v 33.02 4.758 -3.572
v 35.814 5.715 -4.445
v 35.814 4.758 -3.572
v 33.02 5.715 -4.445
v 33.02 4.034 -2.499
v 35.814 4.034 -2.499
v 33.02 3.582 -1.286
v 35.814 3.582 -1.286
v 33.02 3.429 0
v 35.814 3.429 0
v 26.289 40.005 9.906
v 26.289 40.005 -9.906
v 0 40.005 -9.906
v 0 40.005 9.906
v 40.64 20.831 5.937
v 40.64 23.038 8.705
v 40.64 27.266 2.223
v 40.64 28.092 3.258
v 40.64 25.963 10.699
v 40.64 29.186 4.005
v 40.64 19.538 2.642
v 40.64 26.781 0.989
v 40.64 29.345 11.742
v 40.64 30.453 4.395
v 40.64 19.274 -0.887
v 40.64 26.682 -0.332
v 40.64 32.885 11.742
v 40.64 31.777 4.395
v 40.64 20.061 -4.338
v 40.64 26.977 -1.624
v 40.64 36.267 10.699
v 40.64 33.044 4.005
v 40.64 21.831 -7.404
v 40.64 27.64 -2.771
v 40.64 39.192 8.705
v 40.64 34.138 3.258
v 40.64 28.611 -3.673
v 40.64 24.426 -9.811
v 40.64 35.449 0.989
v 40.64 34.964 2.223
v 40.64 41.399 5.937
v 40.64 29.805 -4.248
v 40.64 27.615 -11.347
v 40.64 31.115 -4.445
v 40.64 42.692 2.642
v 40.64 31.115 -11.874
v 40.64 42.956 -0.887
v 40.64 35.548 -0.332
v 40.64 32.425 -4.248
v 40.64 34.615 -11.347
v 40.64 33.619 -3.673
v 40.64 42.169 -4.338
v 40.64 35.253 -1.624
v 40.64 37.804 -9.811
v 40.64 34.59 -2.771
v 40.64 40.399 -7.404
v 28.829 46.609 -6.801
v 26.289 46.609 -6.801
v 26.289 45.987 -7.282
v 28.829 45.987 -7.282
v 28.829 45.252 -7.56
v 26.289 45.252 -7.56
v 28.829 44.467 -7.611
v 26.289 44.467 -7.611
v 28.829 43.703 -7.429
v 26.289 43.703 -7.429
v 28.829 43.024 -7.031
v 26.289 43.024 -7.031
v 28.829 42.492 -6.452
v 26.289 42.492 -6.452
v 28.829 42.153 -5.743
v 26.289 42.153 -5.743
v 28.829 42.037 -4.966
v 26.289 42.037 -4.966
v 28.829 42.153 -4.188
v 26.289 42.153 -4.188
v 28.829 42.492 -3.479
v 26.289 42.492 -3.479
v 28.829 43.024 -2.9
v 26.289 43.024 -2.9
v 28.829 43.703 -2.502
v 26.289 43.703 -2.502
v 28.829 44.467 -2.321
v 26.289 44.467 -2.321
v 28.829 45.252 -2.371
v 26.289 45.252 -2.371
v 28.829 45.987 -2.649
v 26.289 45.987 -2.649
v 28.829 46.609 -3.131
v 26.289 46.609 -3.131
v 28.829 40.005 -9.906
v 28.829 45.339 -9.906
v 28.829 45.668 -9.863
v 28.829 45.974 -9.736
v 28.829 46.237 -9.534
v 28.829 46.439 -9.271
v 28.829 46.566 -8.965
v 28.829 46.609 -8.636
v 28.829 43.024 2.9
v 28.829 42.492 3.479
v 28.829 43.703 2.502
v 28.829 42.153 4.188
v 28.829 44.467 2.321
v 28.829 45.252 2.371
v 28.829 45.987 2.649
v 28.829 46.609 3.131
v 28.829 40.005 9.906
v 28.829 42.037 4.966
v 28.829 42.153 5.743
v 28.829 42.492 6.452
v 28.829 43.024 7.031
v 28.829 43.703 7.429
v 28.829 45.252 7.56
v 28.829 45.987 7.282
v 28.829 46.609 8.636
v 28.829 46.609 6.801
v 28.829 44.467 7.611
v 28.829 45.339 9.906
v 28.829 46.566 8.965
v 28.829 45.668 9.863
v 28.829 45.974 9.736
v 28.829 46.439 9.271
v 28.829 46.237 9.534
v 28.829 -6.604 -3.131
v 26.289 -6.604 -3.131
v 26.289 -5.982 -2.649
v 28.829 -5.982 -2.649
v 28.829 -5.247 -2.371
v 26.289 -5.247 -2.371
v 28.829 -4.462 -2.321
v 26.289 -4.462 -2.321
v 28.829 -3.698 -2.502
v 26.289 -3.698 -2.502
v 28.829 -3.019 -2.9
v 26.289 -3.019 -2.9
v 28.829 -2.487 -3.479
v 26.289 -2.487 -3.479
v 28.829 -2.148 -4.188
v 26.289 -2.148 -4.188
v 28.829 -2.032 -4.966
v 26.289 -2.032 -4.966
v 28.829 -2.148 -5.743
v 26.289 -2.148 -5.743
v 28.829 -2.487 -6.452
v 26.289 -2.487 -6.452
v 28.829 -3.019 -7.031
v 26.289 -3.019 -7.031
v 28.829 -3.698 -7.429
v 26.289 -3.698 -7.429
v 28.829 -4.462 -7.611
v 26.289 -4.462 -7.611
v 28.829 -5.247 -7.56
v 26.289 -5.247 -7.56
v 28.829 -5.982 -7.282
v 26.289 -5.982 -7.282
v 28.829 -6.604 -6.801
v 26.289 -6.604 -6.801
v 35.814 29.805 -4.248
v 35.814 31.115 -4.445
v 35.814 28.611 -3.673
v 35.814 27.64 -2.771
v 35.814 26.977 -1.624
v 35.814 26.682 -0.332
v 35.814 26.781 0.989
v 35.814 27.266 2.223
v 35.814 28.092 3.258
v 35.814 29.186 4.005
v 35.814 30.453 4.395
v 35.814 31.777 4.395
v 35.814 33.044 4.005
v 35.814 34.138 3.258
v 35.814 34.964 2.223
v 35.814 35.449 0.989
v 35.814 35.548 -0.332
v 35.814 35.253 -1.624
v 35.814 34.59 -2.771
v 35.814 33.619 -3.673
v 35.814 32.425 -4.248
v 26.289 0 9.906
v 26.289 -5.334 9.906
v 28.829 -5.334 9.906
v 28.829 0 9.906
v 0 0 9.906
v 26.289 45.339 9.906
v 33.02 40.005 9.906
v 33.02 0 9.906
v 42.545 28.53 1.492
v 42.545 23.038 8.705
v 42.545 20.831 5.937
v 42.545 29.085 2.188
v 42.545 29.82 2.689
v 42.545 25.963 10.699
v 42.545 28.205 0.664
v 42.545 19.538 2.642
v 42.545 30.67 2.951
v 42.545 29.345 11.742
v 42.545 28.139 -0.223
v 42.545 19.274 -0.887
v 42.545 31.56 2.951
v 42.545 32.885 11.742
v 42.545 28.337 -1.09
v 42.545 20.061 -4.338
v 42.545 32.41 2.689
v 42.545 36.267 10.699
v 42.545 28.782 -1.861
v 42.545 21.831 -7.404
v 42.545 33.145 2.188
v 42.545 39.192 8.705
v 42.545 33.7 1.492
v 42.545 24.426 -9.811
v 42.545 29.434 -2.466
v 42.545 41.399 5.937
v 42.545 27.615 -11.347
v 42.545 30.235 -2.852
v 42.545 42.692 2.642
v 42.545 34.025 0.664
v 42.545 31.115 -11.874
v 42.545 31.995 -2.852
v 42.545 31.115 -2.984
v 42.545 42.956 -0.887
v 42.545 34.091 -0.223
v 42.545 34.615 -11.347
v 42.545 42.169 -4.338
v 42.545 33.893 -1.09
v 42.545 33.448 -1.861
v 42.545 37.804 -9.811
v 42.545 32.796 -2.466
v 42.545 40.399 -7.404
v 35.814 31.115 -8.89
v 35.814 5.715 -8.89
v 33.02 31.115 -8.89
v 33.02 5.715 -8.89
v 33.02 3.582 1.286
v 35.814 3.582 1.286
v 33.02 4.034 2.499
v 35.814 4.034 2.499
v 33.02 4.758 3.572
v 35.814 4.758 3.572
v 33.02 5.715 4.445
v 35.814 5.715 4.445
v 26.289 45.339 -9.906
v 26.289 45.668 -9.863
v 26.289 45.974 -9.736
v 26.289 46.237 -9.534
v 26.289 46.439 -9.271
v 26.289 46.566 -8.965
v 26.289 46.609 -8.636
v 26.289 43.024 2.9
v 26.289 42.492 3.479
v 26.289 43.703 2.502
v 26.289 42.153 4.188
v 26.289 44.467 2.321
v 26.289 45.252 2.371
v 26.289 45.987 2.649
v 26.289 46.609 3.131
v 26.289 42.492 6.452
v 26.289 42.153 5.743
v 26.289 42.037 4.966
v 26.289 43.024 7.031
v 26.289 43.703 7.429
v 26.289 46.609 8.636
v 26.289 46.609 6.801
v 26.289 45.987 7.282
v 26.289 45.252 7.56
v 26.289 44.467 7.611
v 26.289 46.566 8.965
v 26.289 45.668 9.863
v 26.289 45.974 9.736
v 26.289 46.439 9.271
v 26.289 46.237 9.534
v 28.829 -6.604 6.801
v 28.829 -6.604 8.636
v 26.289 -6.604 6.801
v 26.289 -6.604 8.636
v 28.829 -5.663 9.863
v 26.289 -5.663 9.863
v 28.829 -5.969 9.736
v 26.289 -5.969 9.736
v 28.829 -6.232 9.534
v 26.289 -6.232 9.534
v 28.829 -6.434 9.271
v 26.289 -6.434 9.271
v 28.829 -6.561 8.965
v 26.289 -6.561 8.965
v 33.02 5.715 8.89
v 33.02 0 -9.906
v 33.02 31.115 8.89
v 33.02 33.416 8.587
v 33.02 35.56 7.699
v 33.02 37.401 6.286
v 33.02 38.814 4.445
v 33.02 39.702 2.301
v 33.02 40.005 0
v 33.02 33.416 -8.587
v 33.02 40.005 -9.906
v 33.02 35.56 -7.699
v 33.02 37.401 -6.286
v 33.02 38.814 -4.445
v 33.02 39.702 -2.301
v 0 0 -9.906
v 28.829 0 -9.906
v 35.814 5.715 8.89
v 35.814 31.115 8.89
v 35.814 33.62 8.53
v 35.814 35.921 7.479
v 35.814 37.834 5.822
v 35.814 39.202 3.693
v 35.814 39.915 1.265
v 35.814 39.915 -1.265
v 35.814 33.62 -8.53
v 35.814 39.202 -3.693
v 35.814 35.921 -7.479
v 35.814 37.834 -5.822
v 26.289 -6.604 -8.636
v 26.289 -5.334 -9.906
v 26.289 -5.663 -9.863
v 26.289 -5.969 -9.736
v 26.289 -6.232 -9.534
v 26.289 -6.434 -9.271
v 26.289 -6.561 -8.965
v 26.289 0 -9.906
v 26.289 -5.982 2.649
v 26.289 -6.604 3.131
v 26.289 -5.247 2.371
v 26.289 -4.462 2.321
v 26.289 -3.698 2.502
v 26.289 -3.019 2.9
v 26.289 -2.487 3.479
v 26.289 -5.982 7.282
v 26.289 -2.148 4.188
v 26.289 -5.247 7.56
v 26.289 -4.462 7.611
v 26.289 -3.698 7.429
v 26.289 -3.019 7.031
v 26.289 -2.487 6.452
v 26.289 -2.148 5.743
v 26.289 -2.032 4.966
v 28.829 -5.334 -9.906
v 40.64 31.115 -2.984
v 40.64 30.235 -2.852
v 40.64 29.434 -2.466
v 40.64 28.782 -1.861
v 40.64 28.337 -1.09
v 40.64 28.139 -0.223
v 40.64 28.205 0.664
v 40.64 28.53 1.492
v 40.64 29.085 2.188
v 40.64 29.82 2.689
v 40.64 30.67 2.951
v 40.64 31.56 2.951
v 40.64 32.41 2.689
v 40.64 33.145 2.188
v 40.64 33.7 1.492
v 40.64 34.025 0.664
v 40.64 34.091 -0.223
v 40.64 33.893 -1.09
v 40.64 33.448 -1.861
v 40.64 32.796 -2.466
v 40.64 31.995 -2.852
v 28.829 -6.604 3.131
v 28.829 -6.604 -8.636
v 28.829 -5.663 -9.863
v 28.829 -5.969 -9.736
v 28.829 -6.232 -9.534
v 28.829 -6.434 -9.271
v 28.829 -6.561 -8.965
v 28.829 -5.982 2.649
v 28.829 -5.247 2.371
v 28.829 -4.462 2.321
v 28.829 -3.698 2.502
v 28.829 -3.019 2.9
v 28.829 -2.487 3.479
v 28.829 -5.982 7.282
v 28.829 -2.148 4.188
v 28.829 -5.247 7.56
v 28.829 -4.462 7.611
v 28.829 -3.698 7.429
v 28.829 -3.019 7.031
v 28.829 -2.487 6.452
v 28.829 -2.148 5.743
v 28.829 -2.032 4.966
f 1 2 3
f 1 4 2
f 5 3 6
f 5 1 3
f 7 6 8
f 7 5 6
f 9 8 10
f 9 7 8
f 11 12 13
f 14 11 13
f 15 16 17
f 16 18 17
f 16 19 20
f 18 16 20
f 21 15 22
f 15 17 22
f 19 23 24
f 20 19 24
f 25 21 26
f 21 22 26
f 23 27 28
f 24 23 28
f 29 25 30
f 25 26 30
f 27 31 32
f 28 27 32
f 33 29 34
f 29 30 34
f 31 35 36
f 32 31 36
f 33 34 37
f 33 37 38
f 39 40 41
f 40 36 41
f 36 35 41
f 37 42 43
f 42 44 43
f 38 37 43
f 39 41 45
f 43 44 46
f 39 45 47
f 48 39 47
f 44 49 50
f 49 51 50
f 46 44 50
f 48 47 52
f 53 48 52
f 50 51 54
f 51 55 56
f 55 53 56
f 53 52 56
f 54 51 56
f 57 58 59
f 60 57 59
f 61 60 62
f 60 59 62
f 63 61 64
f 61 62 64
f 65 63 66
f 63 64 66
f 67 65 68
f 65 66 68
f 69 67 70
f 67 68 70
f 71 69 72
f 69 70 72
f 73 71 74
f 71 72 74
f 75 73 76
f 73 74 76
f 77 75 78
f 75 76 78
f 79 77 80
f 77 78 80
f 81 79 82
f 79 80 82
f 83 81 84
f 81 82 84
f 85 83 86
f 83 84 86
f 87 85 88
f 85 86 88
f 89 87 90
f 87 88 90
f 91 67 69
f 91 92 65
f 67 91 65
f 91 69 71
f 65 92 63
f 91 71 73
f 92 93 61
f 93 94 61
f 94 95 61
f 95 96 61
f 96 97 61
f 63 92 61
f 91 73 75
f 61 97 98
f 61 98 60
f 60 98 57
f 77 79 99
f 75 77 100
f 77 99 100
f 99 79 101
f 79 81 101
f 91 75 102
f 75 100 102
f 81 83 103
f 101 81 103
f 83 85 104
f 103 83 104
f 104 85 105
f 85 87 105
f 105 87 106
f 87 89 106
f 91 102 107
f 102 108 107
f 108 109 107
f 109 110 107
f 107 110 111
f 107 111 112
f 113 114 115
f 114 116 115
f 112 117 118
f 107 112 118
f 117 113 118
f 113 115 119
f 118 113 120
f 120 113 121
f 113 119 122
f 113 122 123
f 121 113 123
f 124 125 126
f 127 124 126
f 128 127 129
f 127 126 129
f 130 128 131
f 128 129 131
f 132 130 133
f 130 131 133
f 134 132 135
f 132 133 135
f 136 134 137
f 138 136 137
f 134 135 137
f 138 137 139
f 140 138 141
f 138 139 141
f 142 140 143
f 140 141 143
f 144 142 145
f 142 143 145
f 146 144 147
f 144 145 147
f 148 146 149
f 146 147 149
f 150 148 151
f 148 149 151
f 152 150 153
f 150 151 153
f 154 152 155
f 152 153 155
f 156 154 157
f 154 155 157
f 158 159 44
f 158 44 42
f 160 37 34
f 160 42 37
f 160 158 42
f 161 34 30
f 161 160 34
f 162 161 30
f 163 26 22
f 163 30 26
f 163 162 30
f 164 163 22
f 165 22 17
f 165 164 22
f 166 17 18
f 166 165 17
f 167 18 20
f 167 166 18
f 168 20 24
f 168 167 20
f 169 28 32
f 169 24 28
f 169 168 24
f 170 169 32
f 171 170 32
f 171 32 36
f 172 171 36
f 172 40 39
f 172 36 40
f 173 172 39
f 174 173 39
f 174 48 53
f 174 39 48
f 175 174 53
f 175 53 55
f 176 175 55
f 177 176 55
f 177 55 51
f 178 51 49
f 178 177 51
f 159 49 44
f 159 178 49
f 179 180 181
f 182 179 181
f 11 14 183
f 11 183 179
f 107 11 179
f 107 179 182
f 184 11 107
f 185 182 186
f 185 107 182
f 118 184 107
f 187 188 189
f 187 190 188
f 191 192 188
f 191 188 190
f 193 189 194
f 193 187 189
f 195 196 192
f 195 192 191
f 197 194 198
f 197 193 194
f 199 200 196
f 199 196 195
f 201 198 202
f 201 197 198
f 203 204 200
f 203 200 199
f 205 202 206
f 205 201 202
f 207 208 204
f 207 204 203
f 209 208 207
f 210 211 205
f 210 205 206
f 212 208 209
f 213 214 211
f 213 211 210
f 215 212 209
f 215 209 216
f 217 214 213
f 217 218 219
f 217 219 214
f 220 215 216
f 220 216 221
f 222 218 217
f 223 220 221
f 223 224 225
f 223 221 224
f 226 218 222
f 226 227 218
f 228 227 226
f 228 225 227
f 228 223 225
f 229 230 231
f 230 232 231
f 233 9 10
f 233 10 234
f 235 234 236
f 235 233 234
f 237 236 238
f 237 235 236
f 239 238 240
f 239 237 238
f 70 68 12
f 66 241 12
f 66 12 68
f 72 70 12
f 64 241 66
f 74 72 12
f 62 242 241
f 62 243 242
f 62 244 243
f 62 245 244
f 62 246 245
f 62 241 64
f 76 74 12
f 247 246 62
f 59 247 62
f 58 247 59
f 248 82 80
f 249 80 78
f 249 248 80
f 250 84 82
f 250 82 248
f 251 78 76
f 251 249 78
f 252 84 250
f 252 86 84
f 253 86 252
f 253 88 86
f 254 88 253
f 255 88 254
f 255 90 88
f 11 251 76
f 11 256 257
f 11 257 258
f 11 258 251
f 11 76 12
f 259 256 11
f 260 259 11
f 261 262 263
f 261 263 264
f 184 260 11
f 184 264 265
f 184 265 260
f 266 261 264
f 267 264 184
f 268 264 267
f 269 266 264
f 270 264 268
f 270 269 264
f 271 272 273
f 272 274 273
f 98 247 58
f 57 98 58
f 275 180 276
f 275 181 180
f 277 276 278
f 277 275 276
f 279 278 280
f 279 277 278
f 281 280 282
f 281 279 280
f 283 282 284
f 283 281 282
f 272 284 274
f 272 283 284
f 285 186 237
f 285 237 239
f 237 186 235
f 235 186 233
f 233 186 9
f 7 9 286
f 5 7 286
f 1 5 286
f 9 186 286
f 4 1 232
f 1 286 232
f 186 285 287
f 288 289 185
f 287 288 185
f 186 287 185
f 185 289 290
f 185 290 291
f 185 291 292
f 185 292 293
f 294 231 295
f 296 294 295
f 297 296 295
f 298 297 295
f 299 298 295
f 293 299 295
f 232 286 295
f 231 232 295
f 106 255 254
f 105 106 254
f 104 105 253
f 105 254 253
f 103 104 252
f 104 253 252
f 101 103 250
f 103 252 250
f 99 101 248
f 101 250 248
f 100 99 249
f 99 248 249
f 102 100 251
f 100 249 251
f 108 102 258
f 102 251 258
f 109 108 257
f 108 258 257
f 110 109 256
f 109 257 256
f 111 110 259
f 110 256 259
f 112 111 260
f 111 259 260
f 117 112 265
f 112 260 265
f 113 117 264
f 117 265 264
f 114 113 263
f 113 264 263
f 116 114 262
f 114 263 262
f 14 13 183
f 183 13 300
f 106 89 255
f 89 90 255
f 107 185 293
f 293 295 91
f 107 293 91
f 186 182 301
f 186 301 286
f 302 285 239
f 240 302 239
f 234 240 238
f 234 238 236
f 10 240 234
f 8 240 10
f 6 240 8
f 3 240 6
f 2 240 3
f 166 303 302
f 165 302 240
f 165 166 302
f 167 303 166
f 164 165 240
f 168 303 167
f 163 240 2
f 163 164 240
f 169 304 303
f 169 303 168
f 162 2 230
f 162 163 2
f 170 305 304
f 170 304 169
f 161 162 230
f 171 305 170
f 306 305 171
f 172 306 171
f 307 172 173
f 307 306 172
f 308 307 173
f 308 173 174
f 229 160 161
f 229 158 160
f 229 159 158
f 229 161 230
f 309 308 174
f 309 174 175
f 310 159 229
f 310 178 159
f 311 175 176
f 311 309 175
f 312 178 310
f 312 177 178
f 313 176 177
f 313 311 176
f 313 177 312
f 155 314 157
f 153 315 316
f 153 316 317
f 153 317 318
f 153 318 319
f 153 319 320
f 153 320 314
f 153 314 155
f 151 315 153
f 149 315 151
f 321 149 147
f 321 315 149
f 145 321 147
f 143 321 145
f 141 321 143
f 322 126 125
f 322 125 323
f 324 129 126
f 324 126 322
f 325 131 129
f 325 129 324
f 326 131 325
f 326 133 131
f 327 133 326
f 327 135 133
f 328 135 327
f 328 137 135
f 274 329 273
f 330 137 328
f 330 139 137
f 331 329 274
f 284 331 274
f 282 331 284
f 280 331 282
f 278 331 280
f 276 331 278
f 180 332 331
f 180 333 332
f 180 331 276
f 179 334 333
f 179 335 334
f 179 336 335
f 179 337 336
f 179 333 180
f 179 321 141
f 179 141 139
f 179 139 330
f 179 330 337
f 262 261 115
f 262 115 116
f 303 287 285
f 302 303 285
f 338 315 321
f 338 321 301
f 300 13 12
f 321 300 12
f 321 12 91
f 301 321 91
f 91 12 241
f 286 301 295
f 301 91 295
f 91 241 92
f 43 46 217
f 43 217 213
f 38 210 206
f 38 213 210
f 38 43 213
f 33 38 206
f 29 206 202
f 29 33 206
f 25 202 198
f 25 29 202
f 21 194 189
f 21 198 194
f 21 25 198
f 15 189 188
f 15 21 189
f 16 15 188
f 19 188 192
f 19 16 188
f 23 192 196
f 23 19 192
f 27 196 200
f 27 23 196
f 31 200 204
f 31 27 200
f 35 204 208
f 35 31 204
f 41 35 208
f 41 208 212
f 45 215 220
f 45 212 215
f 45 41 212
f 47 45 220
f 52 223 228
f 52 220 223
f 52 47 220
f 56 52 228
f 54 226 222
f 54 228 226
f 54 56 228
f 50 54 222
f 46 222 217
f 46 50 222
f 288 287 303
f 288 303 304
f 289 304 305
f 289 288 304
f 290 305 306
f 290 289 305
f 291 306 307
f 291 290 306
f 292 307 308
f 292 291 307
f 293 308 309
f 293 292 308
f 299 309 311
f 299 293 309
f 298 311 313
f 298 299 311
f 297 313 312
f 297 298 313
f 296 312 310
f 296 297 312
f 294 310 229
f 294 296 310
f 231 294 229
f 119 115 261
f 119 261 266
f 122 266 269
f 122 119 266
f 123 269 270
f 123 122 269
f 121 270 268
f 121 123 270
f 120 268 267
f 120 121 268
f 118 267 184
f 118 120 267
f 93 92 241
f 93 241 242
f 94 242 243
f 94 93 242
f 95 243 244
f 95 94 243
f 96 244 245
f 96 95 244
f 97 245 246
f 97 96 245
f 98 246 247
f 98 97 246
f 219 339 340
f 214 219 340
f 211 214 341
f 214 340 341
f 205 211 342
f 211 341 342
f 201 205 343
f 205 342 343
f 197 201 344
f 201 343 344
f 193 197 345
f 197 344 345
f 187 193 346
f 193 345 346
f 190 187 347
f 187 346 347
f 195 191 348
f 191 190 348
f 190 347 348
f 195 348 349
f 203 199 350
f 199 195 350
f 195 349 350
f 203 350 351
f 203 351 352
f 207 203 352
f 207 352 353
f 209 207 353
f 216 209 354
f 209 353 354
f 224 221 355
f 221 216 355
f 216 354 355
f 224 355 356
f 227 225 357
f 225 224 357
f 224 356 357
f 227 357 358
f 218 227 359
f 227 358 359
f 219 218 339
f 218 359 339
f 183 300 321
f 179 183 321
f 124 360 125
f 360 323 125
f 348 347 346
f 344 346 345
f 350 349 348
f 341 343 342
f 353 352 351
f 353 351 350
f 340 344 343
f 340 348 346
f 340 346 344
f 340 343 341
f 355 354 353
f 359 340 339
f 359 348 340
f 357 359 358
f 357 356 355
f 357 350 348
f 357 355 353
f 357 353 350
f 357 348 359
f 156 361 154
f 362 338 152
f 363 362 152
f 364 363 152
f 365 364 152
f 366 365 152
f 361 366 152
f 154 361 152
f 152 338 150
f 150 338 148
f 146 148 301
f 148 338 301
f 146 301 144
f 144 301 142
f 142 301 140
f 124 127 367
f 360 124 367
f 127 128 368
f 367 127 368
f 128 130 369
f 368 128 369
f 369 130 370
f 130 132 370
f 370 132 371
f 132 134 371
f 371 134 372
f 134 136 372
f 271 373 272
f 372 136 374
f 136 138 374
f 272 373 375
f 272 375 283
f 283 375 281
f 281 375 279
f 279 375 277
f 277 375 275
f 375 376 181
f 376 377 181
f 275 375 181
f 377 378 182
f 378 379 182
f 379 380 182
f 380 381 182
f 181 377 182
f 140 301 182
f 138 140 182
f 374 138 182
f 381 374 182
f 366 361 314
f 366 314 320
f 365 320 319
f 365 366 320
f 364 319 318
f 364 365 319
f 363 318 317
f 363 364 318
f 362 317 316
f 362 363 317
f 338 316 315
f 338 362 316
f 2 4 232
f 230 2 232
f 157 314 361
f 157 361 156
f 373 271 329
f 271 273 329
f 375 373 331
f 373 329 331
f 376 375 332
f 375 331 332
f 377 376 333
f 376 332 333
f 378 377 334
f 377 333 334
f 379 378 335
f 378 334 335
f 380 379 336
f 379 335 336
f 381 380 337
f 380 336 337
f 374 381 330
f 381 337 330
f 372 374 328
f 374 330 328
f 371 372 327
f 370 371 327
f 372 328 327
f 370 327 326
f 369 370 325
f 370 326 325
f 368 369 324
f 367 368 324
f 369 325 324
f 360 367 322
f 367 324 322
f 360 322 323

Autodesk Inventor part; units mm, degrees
ref_plane "YZ Plane" through (0, 0, 0) normal (1, 0, 0) x (0, 1, 0)
ref_plane "XZ Plane" through (0, 0, 0) normal (0, 1, 0) x (-1, 0, 0)
ref_plane "XY Plane" through (0, 0, 0) normal (0, 0, 1) x (1, 0, 0)
sketch "Sketch1" plane through (0, 0, 0) normal (0, 0, 1) x (1, 0, 0)
  line L0 (0, 0) -> (33.02, 0)
  line L1 (33.02, 0) -> (33.02, 40.005)
  line L2 (33.02, 40.005) -> (0, 40.005)
  line L3 (0, 40.005) -> (0, 0)
  dimension "d0" = 33.02
  dimension "d1" = 40.005
extrude "Extrusion1" add sketch "Sketch1" along normal mid plane 19.812
ref_plane "Work Plane1" through (26.289, 0, 9.906) normal (-1, 0, 0) x (0, 0, 1)
sketch "Sketch2" plane through (26.289, 0, 9.906) normal (-1, 0, 0) x (0, 0, 1)
  line L0 (-19.812, 40.005) -> (0, 40.005) projected
  line L1 (-19.812, 0) -> (0, 0) projected
  line L2 (-9.906, 40.005) -> (0, 40.005)
  line L3 (0, 40.005) -> (0, 46.609)
  line L4 (-9.906, 46.609) -> (-9.906, 44.323)
  arc A0 (-6.7754, 46.609) -> (-3.1052, 46.609) centre (-4.9403, 44.6913) ccw
  line L5 (0, 44.6913) -> (-2.286, 44.6913)
  line L6 (-4.9403, 40.005) -> (-4.9403, 42.037)
  line L7 (-9.906, 40.005) -> (-9.2583, 40.005)
  line L8 (-9.2583, 40.005) -> (-9.2583, 44.323)
  line L9 (-9.2583, 44.323) -> (-9.906, 44.323)
  line L10 (-9.906, 44.323) -> (-9.906, 40.005)
  line L11 (0, 46.609) -> (-3.1052, 46.609)
  line L12 (-6.7754, 46.609) -> (-9.906, 46.609)
  line L13 (-9.906, 40.005) -> (-19.812, 40.005)
  line L14 (-19.812, 40.005) -> (-19.812, 46.609)
  arc A1 (-16.7068, 46.609) -> (-13.0366, 46.609) centre (-14.8717, 44.6913) ccw
  line L15 (-19.812, 44.6913) -> (-17.526, 44.6913)
  line L16 (-14.8717, 40.005) -> (-14.8717, 42.037)
  line L17 (-10.5537, 40.005) -> (-10.5537, 44.323)
  line L18 (-10.5537, 44.323) -> (-9.906, 44.323)
  line L19 (-19.812, 46.609) -> (-16.7068, 46.609)
  line L20 (-13.0366, 46.609) -> (-9.906, 46.609)
  line L21 (0, 0) -> (0, 40.005) projected
  line L22 (-19.812, 40.005) -> (-19.812, 0) projected
  line L23 (0, 20.0025) -> (-19.812, 20.0025) construction
  line L24 (-19.812, 0) -> (0, 0)
  line L25 (0, 0) -> (0, -6.604)
  arc A2 (-3.1052, -6.604) -> (-6.7754, -6.604) centre (-4.9403, -4.6863) ccw
  line L26 (-9.2583, 0) -> (-9.2583, -4.318)
  line L27 (-9.2583, -4.318) -> (-9.906, -4.318)
  line L28 (0, -6.604) -> (-3.1052, -6.604)
  line L29 (-6.7754, -6.604) -> (-9.906, -6.604)
  line L30 (-19.812, -6.604) -> (-16.7068, -6.604)
  line L31 (-19.812, 0) -> (-19.812, -6.604)
  arc A3 (-13.0366, -6.604) -> (-16.7068, -6.604) centre (-14.8717, -4.6863) ccw
  line L32 (-9.906, 0) -> (-19.812, 0)
  line L33 (-10.5537, 0) -> (-10.5537, -4.318)
  line L34 (-10.5537, -4.318) -> (-9.906, -4.318)
  line L35 (-13.0366, -6.604) -> (-9.906, -6.604)
  dimension "d5" = 6.604
  dimension "d6" = 2.286
  dimension "d7" = 2.032
  dimension "d8" = 0.6477
  dimension "d9" = 4.318
  dimension "d11" = 4.318
extrude "Extrusion2" add sketch "Sketch2" against normal blind 2.54 contours L14 L15 A1 L16 L0 | L16 A1 L20 L4 L18 L17 L0 | L14 L19 A1 L15 | L1 L33 L34 L27 L26 L25 L28 A2 L29 L35 A3 L30 L31 | L17 L18 L10 L0 | L1 L26 L27 L34 L33 | L10 L9 L8 L0 | L8 L9 L4 L12 A0 L6 L0 | L6 A0 L5 L3 L0 | L5 A0 L11 L3
fillet "Fillet1" radius 1.27 4 edges at (27.559, 46.609, 9.906) (27.559, 46.609, -9.906) (27.559, -6.604, 9.906) (27.559, -6.604, -9.906)
sketch "Sketch3" plane through (33.02, 0, 9.906) normal (1, 0, 0) x (0, 0, -1)
  line L0 (1.016, 5.715) -> (18.796, 5.715)
  line L1 (18.796, 5.715) -> (18.796, 31.115)
  line L2 (9.906, 40.005) -> (9.906, 40.005)
  line L3 (1.016, 31.115) -> (1.016, 5.715)
  line L4 (19.812, 40.005) -> (0, 40.005) construction
  line L5 (0, 0) -> (0, 40.005) construction
  arc A0 (9.906, 40.005) -> (1.016, 31.115) centre (9.906, 31.115) ccw
  arc A1 (18.796, 31.115) -> (9.906, 40.005) centre (9.906, 31.115) ccw
  line L6 (9.906, 5.715) -> (9.906, 3.429) construction
  arc A2 (5.461, 5.715) -> (9.906, 3.429) centre (9.906, 8.8935) ccw
  arc A3 (9.906, 3.429) -> (14.351, 5.715) centre (9.906, 8.8935) ccw
  point P0 (9.906, 0)
  point P1 (18.796, 40.005)
  point P2 (1.016, 40.005)
  dimension "d15" = 17.78
  dimension "d16" = 34.29
  dimension "d17" = 1.016
  dimension "d18" = 8.89
  dimension "d19" = 2.286
  dimension "d20" = 8.89
  dimension "d21" = 4.445
extrude "Extrusion3" add sketch "Sketch3" along normal blind 2.794
sketch "Sketch4" plane through (35.814, 0, 9.906) normal (1, 0, 0) x (0, 0, -1)
  arc A0 (18.796, 31.115) -> (1.016, 31.115) centre (9.906, 31.115) ccw projected
  circle A1 centre (9.906, 31.115) radius 4.445
  point P0 (9.906, 0)
  dimension "d24" = 8.89
extrude "Extrusion4" add sketch "Sketch4" along normal blind 4.826
sketch "Sketch5" plane through (40.64, 31.115, 0) normal (1, 0, 0) x (0, 0, -1)
  circle A0 centre (0, 0) radius 11.8745
  circle A1 centre (0, 0) radius 2.9845
  point P0 (0, -31.115)
  dimension "d27" = 23.749
  dimension "d28" = 5.969
extrude "Extrusion5" add sketch "Sketch5" along normal blind 1.905
properties part number "HS-322HD"
